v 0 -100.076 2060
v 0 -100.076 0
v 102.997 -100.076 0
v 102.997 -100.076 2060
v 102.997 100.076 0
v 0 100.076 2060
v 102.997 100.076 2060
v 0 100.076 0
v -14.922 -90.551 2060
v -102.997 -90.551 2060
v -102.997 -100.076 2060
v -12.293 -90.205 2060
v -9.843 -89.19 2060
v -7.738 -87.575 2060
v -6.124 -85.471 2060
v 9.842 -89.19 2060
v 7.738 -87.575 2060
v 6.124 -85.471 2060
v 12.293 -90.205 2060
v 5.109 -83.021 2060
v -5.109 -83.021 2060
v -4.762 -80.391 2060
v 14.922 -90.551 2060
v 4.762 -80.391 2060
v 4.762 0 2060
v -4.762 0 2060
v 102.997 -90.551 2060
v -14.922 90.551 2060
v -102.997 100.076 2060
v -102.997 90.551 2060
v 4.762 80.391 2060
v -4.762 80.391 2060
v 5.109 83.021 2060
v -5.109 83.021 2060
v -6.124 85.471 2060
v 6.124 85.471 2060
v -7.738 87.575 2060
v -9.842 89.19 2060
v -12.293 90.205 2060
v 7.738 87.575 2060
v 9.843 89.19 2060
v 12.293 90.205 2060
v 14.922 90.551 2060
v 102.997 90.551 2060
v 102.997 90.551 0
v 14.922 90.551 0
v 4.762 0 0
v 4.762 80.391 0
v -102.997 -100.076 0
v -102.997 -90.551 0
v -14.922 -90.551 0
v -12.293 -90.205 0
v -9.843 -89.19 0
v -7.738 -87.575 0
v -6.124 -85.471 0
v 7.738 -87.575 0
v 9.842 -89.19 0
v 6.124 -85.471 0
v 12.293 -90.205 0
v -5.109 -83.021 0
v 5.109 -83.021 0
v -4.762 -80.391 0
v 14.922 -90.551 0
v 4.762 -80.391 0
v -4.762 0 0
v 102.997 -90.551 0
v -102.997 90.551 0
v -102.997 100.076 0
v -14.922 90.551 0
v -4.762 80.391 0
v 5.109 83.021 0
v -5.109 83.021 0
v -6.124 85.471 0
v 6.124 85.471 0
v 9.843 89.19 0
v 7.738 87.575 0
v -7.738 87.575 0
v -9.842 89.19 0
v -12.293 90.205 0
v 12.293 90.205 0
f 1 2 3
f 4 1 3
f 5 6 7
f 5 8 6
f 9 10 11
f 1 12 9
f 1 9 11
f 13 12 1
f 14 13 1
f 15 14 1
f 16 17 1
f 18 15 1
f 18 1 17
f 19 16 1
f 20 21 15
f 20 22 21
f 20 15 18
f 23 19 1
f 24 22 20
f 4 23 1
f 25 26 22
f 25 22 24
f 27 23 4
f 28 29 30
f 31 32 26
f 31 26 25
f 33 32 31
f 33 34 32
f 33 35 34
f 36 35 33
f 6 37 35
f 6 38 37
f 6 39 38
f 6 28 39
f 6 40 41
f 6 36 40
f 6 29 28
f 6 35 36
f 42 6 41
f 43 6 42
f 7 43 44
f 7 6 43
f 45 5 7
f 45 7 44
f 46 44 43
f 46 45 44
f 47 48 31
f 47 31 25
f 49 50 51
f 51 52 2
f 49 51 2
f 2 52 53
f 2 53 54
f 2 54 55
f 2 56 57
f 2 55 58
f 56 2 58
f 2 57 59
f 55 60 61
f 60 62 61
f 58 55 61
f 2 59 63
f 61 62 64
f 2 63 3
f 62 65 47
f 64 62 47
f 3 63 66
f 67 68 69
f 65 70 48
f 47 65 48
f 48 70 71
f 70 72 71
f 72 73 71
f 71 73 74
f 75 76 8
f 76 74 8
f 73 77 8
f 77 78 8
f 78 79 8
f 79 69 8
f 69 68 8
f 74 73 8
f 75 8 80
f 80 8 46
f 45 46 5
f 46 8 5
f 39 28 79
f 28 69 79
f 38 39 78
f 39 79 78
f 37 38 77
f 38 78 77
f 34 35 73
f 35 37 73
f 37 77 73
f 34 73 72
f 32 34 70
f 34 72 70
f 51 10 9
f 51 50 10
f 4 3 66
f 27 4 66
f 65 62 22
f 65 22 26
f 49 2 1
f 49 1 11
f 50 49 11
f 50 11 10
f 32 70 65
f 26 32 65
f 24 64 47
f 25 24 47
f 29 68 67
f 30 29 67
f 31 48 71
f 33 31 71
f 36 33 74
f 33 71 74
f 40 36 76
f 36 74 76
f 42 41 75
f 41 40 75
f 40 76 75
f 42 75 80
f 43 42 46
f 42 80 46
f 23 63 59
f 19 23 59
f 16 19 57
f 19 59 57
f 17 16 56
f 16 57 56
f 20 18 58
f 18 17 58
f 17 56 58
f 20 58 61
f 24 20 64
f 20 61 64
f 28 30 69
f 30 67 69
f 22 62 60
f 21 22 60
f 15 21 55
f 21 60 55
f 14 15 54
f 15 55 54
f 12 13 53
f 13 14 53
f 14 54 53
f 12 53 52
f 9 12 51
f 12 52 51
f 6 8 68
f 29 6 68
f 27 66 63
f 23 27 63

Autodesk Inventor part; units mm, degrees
ref_plane "YZ Plane" through (0, 0, 0) normal (1, 0, 0) x (0, 1, 0)
ref_plane "Start Plane" through (0, 0, 0) normal (0, 0, 1) x (1, 0, 0)
ref_plane "End Plane" through (0, 0, 2060) normal (0, 0, 1) x (1, 0, 0)
sketch "Sketch" plane through (0, 0, 0) normal (0, 0, 1) x (1, 0, 0)
  line L0 (-102.997, -100.076) -> (-102.997, -90.551)
  line L1 (-102.997, -90.551) -> (-14.9225, -90.551)
  line L2 (-4.7625, -80.391) -> (-4.7625, 0)
  line L3 (-4.7625, 0) -> (0, 0) construction
  line L4 (0, 0) -> (0, -100.076) construction
  line L5 (0, -100.076) -> (-102.997, -100.076)
  line L6 (-60, 0) -> (80, 0) construction
  line L7 (0, -60) -> (0, 80) construction
  line L8 (102.997, -100.076) -> (102.997, -90.551)
  line L9 (102.997, -90.551) -> (14.9225, -90.551)
  line L10 (4.7625, -80.391) -> (4.7625, 0)
  line L11 (4.7625, 0) -> (0, 0) construction
  line L12 (0, -100.076) -> (102.997, -100.076)
  line L13 (-102.997, 100.076) -> (-102.997, 90.551)
  line L14 (-102.997, 90.551) -> (-14.9225, 90.551)
  line L15 (-4.7625, 80.391) -> (-4.7625, 0)
  line L16 (0, 100.076) -> (-102.997, 100.076)
  line L17 (102.997, 100.076) -> (102.997, 90.551)
  line L18 (102.997, 90.551) -> (14.9225, 90.551)
  line L19 (0, 100.076) -> (102.997, 100.076)
  line L20 (4.7625, 80.391) -> (4.7625, 0)
  arc A0 (-4.7625, 80.391) -> (-14.9225, 90.551) centre (-14.9225, 80.391) ccw
  arc A1 (14.9225, 90.551) -> (4.7625, 80.391) centre (14.9225, 80.391) ccw
  arc A2 (4.7625, -80.391) -> (14.9225, -90.551) centre (14.9225, -80.391) ccw
  arc A3 (-14.9225, -90.551) -> (-4.7625, -80.391) centre (-14.9225, -80.391) ccw
  line L21 (0, 140.1064) -> (0, -140.1064) construction
  line L22 (-144.1958, 0) -> (144.1958, 0) construction
  point P0 (-4.7625, -90.551)
  point P1 (4.7625, -90.551)
  point P2 (-4.7625, 90.551)
  point P3 (4.7625, 90.551)
  dimension "d1" = 100.076
  dimension "d2" = 9.525
  dimension "d3" = 102.997
  dimension "d4" = 4.7625
  dimension "d13" = 10.16
extrude "Body" add sketch "Sketch" along normal up to surface (2060 mm away) from surface at 0
sketch "Sketch4" plane through (0, 0, 0) normal (0, 0, 1) x (1, 0, 0)
  line L0 (0, 0) -> (10, 0)
ref_plane "Work Plane3" through (0, 0, 0) normal (0, -1, 0) x (1, 0, 0)
sketch "Sketch5" plane through (0, 0, 0) normal (0, -1, 0) x (1, 0, 0)
  line L0 (-2, 0) -> (12, 0) projected
  line L1 (-2, 2060) -> (12, 2060) projected
  dimension "d15" = 2060
equation "\"d1\" = 0.5 * G_H"
equation "\"d2\" = G_T1"
equation "\"d3\" = 0.5 * G_W"
equation "\"d4\" = 0.5 * G_T"
equation "\"d13\" = G_IR"
equation "\"d5\" = G_L"
equation "\"G_W\" = 205.994"
equation "\"G_H\" = 200.152"
equation "\"G_T\" = 9.525"
equation "\"G_T1\" = 9.525"
equation "\"G_IR\" = 10.16"
equation "\"G_L\" = d15"
equation "\"G_OFFSET_START\" = 0"
equation "\"G_OFFSET_END\" = 0"
equation "\"d12\" = G_OFFSET_END + B_L"
equation "\"B_L\" = 2060"
properties part number "ASTM A6/A6M - UP8 x 30 (7.88x8.11) - 81.102" material "Steel, Mild"
